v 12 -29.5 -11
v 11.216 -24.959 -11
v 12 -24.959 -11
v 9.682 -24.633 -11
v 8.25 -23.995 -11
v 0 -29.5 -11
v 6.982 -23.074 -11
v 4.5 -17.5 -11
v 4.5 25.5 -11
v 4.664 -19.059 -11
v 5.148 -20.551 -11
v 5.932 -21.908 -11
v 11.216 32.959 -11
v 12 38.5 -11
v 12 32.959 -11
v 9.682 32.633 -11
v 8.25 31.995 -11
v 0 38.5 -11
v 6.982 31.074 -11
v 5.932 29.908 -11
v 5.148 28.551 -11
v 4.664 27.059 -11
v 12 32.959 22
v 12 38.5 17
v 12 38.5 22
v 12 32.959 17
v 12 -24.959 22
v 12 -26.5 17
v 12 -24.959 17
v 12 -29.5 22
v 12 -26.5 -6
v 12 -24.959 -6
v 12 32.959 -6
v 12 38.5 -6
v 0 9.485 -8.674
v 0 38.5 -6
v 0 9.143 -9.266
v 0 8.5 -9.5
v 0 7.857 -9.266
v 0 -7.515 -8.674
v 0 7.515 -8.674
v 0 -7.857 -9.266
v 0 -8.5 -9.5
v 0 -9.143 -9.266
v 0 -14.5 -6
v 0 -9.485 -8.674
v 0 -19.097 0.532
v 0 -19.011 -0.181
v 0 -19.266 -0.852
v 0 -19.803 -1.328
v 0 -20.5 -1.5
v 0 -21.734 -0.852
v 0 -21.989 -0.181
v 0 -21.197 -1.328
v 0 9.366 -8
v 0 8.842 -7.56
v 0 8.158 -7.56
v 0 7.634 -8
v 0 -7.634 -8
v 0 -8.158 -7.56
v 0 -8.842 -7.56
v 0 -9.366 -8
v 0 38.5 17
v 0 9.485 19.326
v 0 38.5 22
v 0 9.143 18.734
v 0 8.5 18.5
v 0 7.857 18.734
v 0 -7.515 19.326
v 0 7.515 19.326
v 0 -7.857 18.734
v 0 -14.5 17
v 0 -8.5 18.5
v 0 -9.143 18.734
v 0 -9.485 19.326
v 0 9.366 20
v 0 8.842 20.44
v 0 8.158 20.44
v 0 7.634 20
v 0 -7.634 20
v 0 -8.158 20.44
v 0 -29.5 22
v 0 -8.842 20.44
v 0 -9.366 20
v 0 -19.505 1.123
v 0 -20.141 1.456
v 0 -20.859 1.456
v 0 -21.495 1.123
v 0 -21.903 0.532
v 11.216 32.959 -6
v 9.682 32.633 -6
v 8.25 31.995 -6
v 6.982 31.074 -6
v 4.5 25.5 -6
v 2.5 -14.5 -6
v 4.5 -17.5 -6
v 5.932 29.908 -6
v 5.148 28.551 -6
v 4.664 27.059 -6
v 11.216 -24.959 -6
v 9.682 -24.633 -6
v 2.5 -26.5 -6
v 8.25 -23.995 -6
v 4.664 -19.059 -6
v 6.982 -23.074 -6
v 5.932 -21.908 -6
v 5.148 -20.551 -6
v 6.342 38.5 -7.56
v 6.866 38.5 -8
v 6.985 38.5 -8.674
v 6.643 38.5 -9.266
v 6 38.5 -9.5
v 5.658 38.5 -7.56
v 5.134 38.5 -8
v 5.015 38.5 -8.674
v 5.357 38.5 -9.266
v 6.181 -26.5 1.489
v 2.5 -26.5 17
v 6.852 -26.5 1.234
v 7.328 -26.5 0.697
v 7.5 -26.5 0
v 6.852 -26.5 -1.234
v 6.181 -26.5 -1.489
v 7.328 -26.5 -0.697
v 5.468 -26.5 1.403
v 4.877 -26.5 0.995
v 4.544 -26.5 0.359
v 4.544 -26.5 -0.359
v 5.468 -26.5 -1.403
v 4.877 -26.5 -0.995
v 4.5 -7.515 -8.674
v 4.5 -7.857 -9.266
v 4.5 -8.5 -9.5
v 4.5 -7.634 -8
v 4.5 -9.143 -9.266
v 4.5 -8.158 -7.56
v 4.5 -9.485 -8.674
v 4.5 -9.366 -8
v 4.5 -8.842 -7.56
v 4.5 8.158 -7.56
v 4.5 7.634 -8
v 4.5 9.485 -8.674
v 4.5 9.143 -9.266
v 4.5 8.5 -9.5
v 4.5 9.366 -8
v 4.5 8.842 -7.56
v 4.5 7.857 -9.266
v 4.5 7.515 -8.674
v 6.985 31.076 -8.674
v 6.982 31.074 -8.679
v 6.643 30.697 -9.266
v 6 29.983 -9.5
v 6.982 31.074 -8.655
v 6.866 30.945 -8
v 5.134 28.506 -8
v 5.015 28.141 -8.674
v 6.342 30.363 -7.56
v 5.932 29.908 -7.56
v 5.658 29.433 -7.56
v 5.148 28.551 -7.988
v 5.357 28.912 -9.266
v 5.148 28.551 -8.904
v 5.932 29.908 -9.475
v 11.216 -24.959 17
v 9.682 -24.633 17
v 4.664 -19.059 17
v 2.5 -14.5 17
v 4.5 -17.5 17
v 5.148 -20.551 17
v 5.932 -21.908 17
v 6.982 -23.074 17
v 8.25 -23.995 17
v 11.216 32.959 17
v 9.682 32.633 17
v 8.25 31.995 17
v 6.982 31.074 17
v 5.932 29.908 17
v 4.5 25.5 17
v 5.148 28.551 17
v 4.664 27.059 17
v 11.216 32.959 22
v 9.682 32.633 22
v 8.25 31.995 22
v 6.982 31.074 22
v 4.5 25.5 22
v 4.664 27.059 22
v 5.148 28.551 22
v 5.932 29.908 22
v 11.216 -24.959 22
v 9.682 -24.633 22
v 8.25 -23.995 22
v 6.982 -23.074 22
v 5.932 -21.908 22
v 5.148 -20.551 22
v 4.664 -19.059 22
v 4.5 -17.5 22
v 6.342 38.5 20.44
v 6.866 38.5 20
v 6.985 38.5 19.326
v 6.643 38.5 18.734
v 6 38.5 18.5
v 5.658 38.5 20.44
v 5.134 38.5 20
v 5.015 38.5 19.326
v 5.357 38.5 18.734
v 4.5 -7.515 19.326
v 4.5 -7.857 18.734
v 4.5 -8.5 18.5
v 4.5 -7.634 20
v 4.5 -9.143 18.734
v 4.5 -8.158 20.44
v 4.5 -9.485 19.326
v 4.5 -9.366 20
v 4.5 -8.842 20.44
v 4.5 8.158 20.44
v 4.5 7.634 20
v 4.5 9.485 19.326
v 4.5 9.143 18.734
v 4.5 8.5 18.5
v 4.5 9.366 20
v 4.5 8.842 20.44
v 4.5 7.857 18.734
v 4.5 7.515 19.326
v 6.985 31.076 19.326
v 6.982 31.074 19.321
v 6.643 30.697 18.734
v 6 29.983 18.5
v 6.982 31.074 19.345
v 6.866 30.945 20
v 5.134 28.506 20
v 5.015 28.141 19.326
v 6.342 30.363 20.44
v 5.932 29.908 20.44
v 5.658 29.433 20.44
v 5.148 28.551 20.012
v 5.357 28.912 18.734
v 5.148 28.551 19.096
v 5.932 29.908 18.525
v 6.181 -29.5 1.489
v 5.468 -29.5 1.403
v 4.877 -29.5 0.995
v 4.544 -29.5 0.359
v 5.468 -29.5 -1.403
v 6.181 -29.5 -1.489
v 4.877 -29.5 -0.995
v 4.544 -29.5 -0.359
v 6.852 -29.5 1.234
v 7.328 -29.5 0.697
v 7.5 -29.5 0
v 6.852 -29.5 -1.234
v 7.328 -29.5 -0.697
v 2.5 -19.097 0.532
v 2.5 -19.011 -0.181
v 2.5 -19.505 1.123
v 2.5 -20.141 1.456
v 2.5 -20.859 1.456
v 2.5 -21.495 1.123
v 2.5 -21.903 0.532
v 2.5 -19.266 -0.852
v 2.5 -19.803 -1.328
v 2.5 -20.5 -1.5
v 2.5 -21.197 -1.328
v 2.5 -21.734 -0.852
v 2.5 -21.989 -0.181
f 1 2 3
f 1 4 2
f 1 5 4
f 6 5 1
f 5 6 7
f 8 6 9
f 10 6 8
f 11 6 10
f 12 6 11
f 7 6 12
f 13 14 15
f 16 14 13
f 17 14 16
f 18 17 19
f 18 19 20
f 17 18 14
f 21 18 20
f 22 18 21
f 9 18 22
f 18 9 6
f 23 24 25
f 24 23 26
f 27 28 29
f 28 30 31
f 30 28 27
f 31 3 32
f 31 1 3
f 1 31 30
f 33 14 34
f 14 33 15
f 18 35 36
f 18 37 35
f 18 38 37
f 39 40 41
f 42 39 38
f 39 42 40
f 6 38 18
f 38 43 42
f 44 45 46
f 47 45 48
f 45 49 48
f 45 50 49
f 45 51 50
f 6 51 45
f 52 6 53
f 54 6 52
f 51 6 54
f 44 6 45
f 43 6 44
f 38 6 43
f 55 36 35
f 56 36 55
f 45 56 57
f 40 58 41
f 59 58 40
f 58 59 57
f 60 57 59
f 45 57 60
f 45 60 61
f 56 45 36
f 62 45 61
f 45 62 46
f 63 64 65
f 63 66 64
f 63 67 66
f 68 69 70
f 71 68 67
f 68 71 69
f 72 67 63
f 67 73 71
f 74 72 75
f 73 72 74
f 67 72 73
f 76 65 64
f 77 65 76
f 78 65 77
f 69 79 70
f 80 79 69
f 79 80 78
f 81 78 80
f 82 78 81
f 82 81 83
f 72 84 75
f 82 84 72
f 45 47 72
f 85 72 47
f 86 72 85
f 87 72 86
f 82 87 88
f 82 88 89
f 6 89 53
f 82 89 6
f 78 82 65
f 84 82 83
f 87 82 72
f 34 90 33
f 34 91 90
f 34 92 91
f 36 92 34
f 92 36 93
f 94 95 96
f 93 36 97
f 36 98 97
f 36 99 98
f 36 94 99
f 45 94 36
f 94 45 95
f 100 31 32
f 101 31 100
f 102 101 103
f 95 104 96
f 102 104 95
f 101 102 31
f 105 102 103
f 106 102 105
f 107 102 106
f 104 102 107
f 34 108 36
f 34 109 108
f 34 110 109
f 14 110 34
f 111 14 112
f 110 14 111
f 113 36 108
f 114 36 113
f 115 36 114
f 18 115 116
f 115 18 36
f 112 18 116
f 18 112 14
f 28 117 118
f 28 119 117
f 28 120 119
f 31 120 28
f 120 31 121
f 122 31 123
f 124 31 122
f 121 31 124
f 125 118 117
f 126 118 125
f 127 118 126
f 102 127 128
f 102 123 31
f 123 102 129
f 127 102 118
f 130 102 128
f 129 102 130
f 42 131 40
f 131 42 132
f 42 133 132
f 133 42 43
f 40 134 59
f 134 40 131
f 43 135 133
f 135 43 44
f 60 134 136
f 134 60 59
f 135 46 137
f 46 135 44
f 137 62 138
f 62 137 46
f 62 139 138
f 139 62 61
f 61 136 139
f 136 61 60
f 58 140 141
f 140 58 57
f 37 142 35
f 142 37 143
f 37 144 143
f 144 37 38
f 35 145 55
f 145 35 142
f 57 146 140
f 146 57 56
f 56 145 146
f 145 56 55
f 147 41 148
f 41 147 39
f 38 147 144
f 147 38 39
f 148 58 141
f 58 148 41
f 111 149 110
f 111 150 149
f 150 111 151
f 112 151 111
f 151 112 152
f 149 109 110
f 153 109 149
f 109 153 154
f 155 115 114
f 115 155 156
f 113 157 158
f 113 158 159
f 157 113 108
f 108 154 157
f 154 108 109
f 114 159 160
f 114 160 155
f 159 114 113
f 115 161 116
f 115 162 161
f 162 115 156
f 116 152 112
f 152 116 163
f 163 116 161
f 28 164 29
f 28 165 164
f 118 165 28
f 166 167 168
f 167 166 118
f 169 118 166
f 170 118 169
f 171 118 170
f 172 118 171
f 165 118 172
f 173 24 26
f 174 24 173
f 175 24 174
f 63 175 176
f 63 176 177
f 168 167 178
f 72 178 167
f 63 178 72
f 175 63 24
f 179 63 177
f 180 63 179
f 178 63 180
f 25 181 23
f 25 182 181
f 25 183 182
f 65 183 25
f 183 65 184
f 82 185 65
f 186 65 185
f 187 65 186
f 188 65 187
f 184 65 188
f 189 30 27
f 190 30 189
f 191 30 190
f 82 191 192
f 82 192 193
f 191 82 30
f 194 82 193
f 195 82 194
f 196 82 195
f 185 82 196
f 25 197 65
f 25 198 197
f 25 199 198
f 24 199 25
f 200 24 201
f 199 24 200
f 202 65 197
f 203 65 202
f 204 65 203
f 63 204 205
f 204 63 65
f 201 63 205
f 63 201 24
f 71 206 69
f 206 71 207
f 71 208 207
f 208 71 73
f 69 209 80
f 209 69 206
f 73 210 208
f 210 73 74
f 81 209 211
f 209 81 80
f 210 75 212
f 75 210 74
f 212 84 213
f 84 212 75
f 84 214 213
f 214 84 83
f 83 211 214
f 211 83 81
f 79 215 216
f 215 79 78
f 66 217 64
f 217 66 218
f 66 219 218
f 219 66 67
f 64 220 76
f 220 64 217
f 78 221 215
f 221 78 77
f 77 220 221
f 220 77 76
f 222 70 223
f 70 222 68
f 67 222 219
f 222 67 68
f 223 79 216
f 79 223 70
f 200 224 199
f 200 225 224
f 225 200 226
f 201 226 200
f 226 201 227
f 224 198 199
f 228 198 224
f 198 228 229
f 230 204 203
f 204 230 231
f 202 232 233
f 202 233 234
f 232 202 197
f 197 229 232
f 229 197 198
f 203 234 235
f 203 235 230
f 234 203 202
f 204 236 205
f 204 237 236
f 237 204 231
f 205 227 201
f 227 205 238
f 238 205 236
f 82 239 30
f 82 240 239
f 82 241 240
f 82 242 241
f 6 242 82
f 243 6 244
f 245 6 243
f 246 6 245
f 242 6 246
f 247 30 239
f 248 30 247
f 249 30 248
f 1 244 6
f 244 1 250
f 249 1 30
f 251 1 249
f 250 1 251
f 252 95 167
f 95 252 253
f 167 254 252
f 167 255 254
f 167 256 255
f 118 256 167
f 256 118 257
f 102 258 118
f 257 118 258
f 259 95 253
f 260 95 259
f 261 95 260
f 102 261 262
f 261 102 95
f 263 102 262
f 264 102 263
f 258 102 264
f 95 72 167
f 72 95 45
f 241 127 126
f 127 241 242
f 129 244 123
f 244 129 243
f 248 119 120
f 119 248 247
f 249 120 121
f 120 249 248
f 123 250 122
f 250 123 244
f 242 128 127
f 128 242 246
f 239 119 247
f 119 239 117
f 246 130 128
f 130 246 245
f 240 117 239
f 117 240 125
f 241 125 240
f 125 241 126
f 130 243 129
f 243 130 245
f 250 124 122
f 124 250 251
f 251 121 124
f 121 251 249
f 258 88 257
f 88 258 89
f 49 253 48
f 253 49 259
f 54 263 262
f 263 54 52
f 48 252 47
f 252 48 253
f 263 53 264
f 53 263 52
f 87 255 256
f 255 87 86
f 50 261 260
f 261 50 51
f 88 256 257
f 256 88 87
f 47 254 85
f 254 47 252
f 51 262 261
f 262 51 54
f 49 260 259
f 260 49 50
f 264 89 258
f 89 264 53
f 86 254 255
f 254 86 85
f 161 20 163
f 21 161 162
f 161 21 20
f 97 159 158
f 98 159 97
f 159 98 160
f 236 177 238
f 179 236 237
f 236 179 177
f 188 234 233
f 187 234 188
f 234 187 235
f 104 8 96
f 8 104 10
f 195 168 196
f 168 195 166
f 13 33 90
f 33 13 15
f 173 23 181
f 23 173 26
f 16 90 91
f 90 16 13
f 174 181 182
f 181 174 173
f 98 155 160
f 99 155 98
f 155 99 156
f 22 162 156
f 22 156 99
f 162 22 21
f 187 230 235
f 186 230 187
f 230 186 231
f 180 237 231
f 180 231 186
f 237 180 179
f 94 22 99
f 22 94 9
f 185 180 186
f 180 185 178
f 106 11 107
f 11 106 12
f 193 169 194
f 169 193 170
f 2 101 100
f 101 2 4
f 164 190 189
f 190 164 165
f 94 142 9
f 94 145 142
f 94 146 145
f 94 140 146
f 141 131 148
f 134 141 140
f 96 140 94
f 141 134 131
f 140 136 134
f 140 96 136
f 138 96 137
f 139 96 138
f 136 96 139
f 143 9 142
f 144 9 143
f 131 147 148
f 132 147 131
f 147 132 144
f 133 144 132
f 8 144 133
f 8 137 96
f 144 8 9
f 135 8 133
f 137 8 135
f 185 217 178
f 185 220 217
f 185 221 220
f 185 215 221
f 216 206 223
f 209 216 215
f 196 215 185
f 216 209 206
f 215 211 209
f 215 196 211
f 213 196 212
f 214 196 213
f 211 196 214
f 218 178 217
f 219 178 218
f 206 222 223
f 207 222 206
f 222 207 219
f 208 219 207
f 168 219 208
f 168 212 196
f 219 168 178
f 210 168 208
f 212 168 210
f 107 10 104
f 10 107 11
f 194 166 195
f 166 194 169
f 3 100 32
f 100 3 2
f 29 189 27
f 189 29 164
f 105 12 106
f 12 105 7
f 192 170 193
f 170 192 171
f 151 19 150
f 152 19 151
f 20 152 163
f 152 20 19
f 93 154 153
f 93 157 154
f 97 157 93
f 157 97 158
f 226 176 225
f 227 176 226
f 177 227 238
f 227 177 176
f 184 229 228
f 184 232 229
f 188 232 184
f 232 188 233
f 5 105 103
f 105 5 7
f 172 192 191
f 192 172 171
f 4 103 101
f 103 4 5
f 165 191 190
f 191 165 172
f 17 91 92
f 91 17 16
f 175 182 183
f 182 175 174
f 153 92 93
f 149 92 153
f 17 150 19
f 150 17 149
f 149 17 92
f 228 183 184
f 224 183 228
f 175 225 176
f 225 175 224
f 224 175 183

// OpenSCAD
$fs=.75;

difference() {
	union() {
		translate(v = [0, 0, -8.5000000000]) {
			rotate(a = [0, 90, 0]) {
				difference() {
					translate(v = [0, -26.5000000000, 0]) {
						translate(v = [0.0000000000, 32.5000000000, 6.0000000000]) {
							translate(v = [-2.5000000000, -32.5000000000, -6.0000000000]) {
								cube(size = [5.0000000000, 65.0000000000, 12.0000000000]);
							}
						}
					}
					#translate(v = [0, -8.5000000000, 0]) {
						cylinder(d = 2.0000000000, h = 14.0000000000);
					}
					#translate(v = [0, 8.5000000000, 0]) {
						cylinder(d = 2.0000000000, h = 14.0000000000);
					}
					#translate(v = [0, 38.5000000000, 6.0000000000]) {
						rotate(a = [90, 0, 0]) {
							cylinder(d = 2.0000000000, h = 14.0000000000);
						}
					}
				}
			}
		}
		translate(v = [0, 0, 19.5000000000]) {
			rotate(a = [0, 90, 0]) {
				difference() {
					translate(v = [0, -26.5000000000, 0]) {
						translate(v = [0.0000000000, 32.5000000000, 6.0000000000]) {
							translate(v = [-2.5000000000, -32.5000000000, -6.0000000000]) {
								cube(size = [5.0000000000, 65.0000000000, 12.0000000000]);
							}
						}
					}
					#translate(v = [0, -8.5000000000, 0]) {
						cylinder(d = 2.0000000000, h = 14.0000000000);
					}
					#translate(v = [0, 8.5000000000, 0]) {
						cylinder(d = 2.0000000000, h = 14.0000000000);
					}
					#translate(v = [0, 38.5000000000, 6.0000000000]) {
						rotate(a = [90, 0, 0]) {
							cylinder(d = 2.0000000000, h = 14.0000000000);
						}
					}
				}
			}
		}
		translate(v = [0, -29.5000000000, -11.0000000000]) {
			cube(size = [12.0000000000, 3, 33.0000000000]);
		}
		translate(v = [0, -26.5000000000, -11.0000000000]) {
			cube(size = [2.5000000000, 12.0000000000, 33.0000000000]);
		}
	}
	#translate(v = [6.0000000000, 0, 0]) {
		rotate(a = [90, 0, 0]) {
			cylinder(d = 3, h = 50);
		}
	}
	#translate(v = [0, -20.5000000000, 0]) {
		rotate(a = [0, 90, 0]) {
			cylinder(d = 3, h = 20);
		}
	}
	#translate(v = [12.0000000000, 0, 0]) {
		hull() {
			translate(v = [0, -17.5000000000, 0]) {
				translate(v = [-0.0000000000, -0.0000000000, -25.0000000000]) {
					cylinder(d = 15.0000000000, h = 50);
				}
			}
			translate(v = [0, 25.5000000000, 0]) {
				translate(v = [-0.0000000000, -0.0000000000, -25.0000000000]) {
					cylinder(d = 15.0000000000, h = 50);
				}
			}
		}
	}
}
/***********************************************
*********      SolidPython code:      **********
************************************************
 
from solid import *
from solid import extensions
from math import *

class Object:
    pass

servo = Object()
servo.width = 12.0
servo.height = 23.0
servo.wingL = 5.0
servo.holeD = 2.0
servo.wingH = 19.0
servo.wingThk = 4.0

h=servo.wingL
thk= servo.width
servoSpace = 5.0
w = servo.width*2 + servoSpace

def screwHole():
    return cylinder(d=servo.holeD,h=servo.width+2)



def hbar() :
	bar = (cube([h, 3*servo.width+servoSpace+servo.height+1,thk]).align('y-','z-')
	      .move(y=-2*servo.width-.5*servoSpace))
	servo1Hole = screwHole().move(y=-.5*servo.width-.5*servoSpace).debug()
	servo2Hole = screwHole().move(y=.5*servo.width+.5*servoSpace).debug()
	servo3Hole = screwHole().rot(x=90).move(z= servo.width/2,
	                                        y=.5*servoSpace+servo.width+servo.height+1).debug()
	return (bar - servo1Hole - servo2Hole - servo3Hole).rot(y=90)


vbar = cube([thk,3,servo.height+2*h]).move( z=-servo.width/2-h,
	                                        y=-(.5*servoSpace+servo.width*2+3))
Axis3Hole = cylinder(d=3,h=50).rot(x=90).move(x=servo.width/2).debug()

Axis4Hole = cylinder(d=3,h=20).rot(y=90).move(y=-servoSpace/2-servo.width*1.5).debug()

Servo4Cover = cube([2.5,servo.width,servo.height+2*h]).move( z=-servo.width/2-h,
	                                        y=-(.5*servoSpace+servo.width*2))

foo = hull( cylinder(d=servo.width+3,h=50).center().move(y=-servoSpace/2-servo.width-3),
	        cylinder(d=servo.width+3,h=50).center().move(y=servoSpace/2+servo.height)).move(x=thk).debug()

scene = ( hbar().move(z=-servo.width/2-h/2) + hbar().move(z=servo.height-servo.width/2+h/2)
	      + vbar + Servo4Cover - Axis3Hole - Axis4Hole  - foo)

scad_render_to_file(scene, 'preview.scad', '$fs=.75;')
 
 
************************************************/
